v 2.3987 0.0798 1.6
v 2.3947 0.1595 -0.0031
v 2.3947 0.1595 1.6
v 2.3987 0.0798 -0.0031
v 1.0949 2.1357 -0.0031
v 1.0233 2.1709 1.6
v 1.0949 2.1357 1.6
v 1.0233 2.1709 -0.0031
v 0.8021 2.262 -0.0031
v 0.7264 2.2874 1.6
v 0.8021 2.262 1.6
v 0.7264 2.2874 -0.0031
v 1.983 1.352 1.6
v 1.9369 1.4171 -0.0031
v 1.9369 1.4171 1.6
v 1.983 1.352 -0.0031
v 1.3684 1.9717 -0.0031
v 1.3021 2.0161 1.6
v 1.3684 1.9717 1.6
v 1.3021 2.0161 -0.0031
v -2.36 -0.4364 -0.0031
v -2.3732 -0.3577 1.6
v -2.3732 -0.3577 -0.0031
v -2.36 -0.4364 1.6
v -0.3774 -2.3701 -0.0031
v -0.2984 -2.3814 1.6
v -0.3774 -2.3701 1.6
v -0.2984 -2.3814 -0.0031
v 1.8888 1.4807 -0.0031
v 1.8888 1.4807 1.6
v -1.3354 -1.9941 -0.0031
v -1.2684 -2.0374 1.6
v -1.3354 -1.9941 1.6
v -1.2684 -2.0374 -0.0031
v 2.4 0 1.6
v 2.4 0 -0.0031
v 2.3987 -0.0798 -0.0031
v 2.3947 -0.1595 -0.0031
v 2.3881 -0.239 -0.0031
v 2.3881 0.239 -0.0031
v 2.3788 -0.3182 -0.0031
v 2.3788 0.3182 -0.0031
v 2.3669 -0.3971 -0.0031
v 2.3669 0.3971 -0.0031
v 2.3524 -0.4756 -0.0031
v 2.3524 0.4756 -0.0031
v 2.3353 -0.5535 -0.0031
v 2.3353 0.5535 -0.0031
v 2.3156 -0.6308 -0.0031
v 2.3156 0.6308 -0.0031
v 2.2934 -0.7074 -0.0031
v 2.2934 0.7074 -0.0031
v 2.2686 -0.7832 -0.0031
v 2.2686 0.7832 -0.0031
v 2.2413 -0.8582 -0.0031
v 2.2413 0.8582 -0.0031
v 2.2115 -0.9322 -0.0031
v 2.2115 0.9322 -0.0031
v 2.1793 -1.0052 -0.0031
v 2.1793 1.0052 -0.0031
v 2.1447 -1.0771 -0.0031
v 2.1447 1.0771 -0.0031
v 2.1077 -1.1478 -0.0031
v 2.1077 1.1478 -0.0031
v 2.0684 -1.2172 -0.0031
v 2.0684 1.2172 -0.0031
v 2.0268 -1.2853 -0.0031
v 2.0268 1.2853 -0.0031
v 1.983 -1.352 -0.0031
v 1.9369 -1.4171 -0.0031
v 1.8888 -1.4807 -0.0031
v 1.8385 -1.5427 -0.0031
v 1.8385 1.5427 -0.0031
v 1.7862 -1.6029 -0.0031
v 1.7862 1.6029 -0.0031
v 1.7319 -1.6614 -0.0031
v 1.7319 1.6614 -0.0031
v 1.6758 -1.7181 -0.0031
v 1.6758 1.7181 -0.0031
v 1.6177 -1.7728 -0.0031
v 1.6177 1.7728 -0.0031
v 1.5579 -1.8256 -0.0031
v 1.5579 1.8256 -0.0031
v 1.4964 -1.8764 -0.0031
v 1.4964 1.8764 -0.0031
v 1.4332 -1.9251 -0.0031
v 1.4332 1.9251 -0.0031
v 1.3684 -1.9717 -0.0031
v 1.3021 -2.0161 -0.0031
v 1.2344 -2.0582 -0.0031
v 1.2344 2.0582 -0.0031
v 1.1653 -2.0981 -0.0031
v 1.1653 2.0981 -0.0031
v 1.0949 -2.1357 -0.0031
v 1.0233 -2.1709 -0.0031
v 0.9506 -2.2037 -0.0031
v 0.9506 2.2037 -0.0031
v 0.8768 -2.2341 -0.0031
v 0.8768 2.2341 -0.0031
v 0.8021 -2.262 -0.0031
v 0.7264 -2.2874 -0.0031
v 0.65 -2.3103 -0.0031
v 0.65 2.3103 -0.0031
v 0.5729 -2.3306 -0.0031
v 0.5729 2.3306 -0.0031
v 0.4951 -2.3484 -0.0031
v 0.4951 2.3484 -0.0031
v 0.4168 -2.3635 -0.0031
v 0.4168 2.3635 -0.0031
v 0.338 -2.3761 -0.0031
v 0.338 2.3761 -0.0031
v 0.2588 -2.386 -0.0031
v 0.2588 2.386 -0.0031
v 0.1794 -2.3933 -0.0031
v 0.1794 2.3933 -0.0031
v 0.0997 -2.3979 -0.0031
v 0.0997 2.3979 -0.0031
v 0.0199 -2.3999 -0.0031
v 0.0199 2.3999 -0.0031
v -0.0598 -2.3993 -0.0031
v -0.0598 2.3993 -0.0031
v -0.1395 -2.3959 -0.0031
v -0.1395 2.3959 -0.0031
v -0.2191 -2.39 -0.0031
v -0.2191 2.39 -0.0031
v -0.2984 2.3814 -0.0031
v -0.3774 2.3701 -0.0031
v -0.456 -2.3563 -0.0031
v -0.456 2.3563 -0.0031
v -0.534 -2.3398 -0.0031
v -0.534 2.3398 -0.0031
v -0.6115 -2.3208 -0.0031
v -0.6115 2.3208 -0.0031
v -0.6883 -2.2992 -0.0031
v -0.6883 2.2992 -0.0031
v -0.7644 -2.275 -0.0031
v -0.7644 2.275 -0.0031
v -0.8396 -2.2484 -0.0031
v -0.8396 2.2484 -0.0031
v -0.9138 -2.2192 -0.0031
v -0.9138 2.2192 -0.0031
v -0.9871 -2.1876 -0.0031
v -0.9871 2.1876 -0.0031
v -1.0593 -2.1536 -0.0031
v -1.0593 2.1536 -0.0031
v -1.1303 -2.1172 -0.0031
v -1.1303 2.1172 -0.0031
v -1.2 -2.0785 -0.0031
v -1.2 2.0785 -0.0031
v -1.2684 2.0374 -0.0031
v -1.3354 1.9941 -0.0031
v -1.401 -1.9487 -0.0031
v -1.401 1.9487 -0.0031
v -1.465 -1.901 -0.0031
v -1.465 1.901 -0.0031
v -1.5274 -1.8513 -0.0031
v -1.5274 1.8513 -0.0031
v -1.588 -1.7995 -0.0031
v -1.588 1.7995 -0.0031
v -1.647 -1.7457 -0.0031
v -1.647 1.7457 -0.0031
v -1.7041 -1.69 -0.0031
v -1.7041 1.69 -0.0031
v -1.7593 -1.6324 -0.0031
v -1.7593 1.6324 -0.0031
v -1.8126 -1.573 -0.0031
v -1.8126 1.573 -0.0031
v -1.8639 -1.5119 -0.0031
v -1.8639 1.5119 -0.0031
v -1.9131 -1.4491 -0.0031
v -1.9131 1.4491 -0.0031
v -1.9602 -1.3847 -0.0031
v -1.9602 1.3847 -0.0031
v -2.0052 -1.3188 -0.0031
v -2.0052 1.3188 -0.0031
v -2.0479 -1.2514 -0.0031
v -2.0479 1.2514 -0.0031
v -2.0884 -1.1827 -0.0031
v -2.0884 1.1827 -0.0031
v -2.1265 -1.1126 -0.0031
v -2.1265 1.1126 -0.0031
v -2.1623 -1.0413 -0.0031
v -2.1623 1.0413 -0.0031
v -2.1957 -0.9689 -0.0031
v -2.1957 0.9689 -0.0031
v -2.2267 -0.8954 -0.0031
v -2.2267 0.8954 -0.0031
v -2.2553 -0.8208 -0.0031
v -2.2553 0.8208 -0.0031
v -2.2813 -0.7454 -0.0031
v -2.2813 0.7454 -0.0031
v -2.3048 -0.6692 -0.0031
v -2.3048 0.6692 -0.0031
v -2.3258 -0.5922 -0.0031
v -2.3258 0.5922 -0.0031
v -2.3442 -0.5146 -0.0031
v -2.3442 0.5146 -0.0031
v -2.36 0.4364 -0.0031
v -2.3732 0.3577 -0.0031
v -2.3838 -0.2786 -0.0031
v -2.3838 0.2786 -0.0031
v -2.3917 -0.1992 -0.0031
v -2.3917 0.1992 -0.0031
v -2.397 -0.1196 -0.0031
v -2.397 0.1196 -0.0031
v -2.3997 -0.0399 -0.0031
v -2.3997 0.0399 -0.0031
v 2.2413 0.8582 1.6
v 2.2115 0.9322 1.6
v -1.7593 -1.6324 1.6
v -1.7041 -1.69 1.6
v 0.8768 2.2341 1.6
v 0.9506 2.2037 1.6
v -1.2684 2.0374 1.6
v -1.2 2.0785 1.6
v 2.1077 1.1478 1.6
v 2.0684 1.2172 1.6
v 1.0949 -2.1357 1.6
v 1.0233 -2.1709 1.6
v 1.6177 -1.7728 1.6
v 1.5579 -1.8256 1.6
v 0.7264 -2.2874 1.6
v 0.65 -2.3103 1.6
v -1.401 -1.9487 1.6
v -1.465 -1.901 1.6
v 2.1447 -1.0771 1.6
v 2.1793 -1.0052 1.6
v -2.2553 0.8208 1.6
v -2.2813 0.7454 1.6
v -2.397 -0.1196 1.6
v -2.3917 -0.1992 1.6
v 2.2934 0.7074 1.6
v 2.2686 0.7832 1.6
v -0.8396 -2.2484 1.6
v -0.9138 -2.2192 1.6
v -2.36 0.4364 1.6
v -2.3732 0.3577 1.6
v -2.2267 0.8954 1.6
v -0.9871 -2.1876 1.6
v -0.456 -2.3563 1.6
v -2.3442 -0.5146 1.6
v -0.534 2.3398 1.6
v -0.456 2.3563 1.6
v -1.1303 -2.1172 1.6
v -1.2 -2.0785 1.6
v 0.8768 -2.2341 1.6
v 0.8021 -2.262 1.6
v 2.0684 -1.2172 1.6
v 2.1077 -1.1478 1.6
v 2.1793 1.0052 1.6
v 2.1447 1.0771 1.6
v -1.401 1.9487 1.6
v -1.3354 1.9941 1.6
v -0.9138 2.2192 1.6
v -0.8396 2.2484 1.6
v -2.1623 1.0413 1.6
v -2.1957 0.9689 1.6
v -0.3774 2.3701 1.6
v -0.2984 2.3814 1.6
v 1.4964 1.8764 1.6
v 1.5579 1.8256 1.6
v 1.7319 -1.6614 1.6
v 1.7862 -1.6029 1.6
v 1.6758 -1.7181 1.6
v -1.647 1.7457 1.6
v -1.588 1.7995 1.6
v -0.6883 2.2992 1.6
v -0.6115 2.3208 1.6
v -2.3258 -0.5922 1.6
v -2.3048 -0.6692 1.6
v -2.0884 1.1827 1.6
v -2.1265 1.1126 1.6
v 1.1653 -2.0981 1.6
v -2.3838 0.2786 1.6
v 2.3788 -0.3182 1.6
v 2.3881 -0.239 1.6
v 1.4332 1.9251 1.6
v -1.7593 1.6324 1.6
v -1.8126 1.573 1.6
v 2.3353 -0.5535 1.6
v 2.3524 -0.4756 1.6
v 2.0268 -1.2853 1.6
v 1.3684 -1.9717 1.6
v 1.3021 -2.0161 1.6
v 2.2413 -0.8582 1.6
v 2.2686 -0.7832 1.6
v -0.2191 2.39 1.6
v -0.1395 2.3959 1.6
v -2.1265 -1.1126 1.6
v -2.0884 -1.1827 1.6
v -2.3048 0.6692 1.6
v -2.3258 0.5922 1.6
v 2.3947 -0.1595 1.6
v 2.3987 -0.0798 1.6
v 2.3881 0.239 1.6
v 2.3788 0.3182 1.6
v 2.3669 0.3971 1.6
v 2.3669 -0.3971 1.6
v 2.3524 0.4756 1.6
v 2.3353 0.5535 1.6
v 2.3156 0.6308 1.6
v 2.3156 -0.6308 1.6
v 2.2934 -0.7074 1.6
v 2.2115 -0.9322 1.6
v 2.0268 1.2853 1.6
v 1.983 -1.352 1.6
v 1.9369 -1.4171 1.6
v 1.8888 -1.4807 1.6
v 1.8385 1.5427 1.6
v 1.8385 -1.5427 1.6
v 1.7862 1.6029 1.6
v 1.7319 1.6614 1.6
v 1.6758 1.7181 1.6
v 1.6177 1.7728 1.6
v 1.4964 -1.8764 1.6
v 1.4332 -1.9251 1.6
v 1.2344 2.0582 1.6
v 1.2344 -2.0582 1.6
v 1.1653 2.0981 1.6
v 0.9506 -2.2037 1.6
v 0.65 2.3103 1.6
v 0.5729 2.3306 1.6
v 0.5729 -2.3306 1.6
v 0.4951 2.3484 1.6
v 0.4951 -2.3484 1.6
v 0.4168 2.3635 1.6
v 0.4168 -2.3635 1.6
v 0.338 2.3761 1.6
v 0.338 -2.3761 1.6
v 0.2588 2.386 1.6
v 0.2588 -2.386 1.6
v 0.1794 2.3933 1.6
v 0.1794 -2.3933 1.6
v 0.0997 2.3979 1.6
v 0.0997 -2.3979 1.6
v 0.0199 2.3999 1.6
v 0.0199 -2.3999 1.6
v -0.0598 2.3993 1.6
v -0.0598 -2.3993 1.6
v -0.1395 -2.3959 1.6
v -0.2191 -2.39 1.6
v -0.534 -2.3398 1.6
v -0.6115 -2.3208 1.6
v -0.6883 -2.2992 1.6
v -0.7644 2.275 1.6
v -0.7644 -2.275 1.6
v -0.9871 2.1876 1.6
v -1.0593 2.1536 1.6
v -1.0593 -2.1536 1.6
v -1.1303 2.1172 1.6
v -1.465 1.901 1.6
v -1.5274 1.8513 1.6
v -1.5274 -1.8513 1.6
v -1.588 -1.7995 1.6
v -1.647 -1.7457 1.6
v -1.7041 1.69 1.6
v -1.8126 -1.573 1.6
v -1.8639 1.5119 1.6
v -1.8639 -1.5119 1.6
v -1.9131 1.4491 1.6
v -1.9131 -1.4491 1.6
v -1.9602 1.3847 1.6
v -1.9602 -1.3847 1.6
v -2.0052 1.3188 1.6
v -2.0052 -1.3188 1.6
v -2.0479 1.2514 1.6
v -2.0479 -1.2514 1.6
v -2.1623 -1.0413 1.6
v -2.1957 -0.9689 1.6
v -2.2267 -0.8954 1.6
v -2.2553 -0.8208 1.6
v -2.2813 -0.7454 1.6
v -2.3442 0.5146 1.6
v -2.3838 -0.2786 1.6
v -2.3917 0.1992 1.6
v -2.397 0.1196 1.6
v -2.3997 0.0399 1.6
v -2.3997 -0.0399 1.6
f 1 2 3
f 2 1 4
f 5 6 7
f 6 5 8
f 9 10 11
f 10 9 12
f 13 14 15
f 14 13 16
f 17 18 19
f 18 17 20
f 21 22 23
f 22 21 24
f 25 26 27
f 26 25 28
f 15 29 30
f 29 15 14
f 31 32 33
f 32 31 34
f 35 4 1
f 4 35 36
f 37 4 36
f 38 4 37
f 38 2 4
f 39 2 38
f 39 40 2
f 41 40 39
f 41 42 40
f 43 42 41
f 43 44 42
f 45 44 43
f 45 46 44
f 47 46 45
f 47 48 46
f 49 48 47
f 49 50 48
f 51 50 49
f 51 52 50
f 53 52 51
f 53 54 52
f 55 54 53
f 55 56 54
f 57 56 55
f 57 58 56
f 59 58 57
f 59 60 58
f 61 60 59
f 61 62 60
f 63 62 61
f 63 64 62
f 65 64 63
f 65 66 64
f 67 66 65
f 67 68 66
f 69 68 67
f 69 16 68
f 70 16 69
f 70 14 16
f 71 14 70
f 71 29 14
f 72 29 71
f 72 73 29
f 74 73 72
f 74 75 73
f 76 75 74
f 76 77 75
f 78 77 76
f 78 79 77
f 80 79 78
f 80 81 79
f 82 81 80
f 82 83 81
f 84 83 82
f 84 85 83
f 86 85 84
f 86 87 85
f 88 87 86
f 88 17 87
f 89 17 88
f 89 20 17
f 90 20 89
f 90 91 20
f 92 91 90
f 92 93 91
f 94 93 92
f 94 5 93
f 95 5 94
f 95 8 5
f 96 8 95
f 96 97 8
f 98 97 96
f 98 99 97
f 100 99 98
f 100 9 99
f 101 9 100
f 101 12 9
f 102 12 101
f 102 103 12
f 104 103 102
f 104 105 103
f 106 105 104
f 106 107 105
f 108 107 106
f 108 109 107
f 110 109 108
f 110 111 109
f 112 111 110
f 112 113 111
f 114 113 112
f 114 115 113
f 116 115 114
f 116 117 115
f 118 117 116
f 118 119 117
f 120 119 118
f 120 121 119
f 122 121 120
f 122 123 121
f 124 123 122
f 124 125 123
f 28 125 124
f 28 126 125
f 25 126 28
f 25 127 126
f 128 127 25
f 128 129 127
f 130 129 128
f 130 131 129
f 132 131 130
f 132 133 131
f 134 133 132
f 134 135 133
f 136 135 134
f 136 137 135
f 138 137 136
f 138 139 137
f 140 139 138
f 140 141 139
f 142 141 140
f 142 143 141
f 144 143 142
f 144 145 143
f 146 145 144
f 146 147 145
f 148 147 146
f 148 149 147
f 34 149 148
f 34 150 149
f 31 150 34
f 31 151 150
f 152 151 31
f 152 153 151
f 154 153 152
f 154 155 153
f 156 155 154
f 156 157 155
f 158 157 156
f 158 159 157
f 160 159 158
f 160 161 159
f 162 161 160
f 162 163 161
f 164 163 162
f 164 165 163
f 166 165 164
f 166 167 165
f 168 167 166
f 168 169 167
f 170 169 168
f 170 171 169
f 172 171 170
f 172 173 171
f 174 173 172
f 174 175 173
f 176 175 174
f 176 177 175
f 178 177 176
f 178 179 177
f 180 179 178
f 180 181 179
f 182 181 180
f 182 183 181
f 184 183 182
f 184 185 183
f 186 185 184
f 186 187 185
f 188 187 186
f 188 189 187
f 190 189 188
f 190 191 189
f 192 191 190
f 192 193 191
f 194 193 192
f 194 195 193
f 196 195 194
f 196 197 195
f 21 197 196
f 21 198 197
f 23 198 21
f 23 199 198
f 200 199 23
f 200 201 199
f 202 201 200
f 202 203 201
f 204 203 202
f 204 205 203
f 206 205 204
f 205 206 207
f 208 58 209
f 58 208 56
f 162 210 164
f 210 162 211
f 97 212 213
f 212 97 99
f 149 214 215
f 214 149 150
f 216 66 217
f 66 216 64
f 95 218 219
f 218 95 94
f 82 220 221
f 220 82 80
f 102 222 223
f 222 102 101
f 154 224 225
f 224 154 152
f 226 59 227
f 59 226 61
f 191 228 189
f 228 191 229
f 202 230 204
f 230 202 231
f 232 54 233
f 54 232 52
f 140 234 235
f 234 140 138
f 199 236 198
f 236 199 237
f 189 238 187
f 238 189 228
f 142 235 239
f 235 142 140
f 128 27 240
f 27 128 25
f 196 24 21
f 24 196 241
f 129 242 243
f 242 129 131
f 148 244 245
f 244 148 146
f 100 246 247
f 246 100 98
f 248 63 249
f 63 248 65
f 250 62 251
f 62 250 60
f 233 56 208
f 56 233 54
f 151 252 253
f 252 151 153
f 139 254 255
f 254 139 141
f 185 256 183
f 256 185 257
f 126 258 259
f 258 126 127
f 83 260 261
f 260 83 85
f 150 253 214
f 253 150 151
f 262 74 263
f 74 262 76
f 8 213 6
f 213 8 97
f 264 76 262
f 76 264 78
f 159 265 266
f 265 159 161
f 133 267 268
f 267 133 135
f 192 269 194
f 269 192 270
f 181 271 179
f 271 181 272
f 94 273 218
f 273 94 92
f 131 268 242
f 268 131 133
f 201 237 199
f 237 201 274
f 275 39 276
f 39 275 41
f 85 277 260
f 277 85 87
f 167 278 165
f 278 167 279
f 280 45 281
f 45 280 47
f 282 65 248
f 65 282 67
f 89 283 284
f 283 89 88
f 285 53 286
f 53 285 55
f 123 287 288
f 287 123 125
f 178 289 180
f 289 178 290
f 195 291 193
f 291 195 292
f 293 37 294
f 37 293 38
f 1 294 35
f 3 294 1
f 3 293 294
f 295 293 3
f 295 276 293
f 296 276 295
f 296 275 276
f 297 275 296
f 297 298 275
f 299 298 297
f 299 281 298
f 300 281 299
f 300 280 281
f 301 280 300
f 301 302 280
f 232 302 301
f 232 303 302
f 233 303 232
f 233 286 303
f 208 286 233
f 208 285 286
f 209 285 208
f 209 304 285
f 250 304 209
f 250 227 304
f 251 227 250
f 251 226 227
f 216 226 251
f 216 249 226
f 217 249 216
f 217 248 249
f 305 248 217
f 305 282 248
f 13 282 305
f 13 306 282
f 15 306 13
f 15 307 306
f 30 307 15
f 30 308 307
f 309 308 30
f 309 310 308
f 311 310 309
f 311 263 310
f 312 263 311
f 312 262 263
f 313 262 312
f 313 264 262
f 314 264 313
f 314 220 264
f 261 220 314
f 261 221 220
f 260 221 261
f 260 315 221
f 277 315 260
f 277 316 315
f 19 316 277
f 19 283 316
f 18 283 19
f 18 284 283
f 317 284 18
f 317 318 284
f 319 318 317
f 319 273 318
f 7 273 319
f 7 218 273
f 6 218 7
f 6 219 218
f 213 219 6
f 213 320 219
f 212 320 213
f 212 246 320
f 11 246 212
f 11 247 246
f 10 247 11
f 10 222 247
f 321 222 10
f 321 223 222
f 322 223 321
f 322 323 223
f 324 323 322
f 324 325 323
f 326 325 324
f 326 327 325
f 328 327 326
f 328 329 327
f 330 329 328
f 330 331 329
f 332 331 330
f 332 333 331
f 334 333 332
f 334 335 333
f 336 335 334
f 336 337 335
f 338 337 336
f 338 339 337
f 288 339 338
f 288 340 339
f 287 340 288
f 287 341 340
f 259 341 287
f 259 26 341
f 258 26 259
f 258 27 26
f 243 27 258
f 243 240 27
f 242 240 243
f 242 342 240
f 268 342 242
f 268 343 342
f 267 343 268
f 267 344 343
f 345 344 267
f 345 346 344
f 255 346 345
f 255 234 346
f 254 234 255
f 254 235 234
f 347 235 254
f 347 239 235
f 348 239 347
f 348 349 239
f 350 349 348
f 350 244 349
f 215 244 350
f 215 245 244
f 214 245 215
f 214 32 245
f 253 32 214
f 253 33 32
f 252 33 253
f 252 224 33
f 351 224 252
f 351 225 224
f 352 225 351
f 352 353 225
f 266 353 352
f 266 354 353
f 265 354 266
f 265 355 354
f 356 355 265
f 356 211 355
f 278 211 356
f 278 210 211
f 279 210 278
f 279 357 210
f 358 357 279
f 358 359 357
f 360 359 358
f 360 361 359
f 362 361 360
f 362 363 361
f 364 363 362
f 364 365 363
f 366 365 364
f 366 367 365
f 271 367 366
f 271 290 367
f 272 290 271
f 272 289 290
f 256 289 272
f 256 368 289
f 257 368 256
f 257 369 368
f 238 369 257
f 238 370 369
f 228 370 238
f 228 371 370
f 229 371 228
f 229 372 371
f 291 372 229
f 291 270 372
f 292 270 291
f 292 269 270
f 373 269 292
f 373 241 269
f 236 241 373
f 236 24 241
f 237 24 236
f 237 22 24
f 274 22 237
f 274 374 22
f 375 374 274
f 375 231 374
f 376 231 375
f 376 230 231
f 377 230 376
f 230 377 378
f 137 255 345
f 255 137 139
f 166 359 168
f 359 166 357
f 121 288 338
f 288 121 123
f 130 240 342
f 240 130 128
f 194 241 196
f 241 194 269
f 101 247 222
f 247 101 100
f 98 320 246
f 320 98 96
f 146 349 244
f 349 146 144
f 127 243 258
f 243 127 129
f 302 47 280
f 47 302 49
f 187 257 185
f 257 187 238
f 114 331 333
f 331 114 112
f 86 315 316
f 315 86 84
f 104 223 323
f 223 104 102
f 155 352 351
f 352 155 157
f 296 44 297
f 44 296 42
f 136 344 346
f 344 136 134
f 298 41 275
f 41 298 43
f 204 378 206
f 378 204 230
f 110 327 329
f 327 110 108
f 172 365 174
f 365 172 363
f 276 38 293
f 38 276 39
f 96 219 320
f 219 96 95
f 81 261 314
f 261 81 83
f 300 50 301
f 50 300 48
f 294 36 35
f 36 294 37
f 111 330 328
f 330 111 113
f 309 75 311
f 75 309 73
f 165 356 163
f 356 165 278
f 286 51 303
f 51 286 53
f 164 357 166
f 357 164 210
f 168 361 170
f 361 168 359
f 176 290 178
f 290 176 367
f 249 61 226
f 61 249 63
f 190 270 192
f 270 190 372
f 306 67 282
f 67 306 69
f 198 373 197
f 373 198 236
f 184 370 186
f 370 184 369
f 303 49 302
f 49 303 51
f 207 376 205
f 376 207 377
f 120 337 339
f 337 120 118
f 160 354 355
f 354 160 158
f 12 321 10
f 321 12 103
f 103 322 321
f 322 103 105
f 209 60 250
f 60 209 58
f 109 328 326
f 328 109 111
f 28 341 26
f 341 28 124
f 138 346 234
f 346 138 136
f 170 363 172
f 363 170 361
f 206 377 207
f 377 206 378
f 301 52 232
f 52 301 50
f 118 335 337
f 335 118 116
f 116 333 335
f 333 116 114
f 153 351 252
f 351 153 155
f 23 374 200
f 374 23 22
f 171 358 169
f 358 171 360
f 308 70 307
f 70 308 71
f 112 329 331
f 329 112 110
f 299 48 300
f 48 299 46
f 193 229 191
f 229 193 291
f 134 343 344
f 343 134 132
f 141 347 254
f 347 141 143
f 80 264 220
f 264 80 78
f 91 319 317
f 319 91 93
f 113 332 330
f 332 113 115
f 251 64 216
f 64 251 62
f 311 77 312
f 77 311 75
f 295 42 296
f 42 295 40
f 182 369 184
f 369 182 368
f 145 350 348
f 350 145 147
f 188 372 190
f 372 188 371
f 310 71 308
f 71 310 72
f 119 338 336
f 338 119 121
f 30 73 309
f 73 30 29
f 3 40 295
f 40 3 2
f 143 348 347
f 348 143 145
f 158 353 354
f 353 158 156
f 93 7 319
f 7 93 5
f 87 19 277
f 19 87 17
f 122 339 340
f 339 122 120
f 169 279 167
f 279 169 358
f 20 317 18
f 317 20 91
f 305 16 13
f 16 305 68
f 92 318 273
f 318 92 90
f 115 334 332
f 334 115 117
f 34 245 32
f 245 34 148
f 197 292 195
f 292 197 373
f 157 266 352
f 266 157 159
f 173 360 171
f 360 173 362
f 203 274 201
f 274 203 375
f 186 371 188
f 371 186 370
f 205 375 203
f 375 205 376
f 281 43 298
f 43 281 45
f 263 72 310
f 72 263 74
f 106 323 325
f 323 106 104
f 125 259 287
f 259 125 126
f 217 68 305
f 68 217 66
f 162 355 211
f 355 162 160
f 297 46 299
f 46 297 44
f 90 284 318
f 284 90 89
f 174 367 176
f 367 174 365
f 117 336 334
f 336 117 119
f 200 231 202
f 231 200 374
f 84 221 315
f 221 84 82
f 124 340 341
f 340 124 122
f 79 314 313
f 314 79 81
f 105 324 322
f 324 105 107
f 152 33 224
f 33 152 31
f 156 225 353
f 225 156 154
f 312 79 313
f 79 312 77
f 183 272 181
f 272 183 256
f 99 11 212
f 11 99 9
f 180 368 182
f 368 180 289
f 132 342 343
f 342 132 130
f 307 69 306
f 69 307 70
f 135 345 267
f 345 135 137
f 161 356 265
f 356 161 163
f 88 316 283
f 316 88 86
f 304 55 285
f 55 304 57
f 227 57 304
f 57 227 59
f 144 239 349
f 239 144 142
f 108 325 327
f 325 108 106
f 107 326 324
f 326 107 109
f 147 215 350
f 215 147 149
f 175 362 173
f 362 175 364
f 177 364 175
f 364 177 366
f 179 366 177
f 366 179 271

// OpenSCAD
use <../lib.scad>
use <../p/box3u2p.scad>
use <../p/box5.scad>
use <../p/clip9.scad>
use <../p/rect3.scad>
use <../p/stud.scad>
$fa=1; $fs=0.2;
function ldraw_lib__4085a(realsolid=false) = [
// 0 Plate  1 x  1 with Clip Vertical (Thin C-Clip)
// 0 Name: 4085a.dat
// 0 Author: James Jessiman
// 0 !LDRAW_ORG Part UPDATE 2013-02
// 0 !LICENSE Licensed under CC BY 2.0 and CC BY 4.0 : see CAreadme.txt
// 
// 0 BFC CERTIFY CCW
  [0,"BFC","CERTIFY"],
  [0,"BFC","CCW"],
// 
// 0 !HISTORY 2001-11-29 [cwdee] rewrite
// 0 !HISTORY 2001-11-30 [PTadmin] Official Update 2001-02
// 0 !HISTORY 2003-01-28 [sbliss] Completed header
// 0 !HISTORY 2003-08-01 [PTadmin] Official Update 2003-02
// 0 !HISTORY 2007-07-01 [PTadmin] Header formatted for Contributor Agreement
// 0 !HISTORY 2008-07-01 [PTadmin] Official Update 2008-01
// 0 !HISTORY 2013-08-07 [C3POwen] Utilised clip9.dat primitive
// 0 !HISTORY 2013-12-23 [PTadmin] Official Update 2013-02
// 
// 
// 4 16 -6 8 6 -6 8 -6 -10 8 -10 -10 8 10
  [4,16,-6,8,6,-6,8,-6,-10,8,-10,-10,8,10],
// 4 16 6 8 6 -6 8 6 -10 8 10 10 8 10
  [4,16,6,8,6,-6,8,6,-10,8,10,10,8,10],
// 4 16 6 8 -6 6 8 6 10 8 10 10 8 -10
  [4,16,6,8,-6,6,8,6,10,8,10,10,8,-10],
// 3 16 -10 8 -10 -6 8 -6 -4 8 -10
  [3,16,-10,8,-10,-6,8,-6,-4,8,-10],
// 4 16 6 8 -6 4 8 -10 -4 8 -10 -6 8 -6
  [4,16,6,8,-6,4,8,-10,-4,8,-10,-6,8,-6],
// 3 16 4 8 -10 6 8 -6 10 8 -10
  [3,16,4,8,-10,6,8,-6,10,8,-10],
// 0 BFC INVERTNEXT
  [0,"BFC","INVERTNEXT"],
// 1 16 0 8 0 -6 0 0 0 -4 0 0 0 -6 box5.dat
  [1,16,0,8,0,-6,0,0,0,-4,0,0,0,-6, ldraw_lib__box5(realsolid)],
// 1 16 0 4 -10 0 0 10 4 0 0 0 20 0 box3u2p.dat
  [1,16,0,4,-10,0,0,10,4,0,0,0,20,0, ldraw_lib__box3u2p(realsolid)],
// 3 16 -10 0 10 -10 0 -10 -4 0 -10
  [3,16,-10,0,10,-10,0,-10,-4,0,-10],
// 4 16 -10 0 10 -4 0 -10 4 0 -10 10 0 10
  [4,16,-10,0,10,-4,0,-10,4,0,-10,10,0,10],
// 3 16 10 0 10 4 0 -10 10 0 -10
  [3,16,10,0,10,4,0,-10,10,0,-10],
// 1 16 -7 4 -10 0 0 3 4 0 0 0 1 0 rect3.dat
  [1,16,-7,4,-10,0,0,3,4,0,0,0,1,0, ldraw_lib__rect3(realsolid)],
// 1 16 0 4 -10 1 0 0 0 1 0 0 0 1 clip9.dat
  [1,16,0,4,-10,1,0,0,0,1,0,0,0,1, ldraw_lib__clip9(realsolid)],
// 1 16 7 4 -10 0 0 -3 -4 0 0 0 1 0 rect3.dat
  [1,16,7,4,-10,0,0,-3,-4,0,0,0,1,0, ldraw_lib__rect3(realsolid)],
// 1 16 0 0 0 0 0 -1 0 1 0 1 0 0 stud.dat
  [1,16,0,0,0,0,0,-1,0,1,0,1,0,0, ldraw_lib__stud(realsolid)],
];
module ldraw_lib__4085a(step=0, col=false, unit=2/5, alt=false, line=0.2, solid=!$preview)
    makepoly(ldraw_lib__4085a(solid), step=step, col=col, unit=unit, alt=alt, line=line, solid=solid);
ldraw_lib__4085a(line=0.2);
